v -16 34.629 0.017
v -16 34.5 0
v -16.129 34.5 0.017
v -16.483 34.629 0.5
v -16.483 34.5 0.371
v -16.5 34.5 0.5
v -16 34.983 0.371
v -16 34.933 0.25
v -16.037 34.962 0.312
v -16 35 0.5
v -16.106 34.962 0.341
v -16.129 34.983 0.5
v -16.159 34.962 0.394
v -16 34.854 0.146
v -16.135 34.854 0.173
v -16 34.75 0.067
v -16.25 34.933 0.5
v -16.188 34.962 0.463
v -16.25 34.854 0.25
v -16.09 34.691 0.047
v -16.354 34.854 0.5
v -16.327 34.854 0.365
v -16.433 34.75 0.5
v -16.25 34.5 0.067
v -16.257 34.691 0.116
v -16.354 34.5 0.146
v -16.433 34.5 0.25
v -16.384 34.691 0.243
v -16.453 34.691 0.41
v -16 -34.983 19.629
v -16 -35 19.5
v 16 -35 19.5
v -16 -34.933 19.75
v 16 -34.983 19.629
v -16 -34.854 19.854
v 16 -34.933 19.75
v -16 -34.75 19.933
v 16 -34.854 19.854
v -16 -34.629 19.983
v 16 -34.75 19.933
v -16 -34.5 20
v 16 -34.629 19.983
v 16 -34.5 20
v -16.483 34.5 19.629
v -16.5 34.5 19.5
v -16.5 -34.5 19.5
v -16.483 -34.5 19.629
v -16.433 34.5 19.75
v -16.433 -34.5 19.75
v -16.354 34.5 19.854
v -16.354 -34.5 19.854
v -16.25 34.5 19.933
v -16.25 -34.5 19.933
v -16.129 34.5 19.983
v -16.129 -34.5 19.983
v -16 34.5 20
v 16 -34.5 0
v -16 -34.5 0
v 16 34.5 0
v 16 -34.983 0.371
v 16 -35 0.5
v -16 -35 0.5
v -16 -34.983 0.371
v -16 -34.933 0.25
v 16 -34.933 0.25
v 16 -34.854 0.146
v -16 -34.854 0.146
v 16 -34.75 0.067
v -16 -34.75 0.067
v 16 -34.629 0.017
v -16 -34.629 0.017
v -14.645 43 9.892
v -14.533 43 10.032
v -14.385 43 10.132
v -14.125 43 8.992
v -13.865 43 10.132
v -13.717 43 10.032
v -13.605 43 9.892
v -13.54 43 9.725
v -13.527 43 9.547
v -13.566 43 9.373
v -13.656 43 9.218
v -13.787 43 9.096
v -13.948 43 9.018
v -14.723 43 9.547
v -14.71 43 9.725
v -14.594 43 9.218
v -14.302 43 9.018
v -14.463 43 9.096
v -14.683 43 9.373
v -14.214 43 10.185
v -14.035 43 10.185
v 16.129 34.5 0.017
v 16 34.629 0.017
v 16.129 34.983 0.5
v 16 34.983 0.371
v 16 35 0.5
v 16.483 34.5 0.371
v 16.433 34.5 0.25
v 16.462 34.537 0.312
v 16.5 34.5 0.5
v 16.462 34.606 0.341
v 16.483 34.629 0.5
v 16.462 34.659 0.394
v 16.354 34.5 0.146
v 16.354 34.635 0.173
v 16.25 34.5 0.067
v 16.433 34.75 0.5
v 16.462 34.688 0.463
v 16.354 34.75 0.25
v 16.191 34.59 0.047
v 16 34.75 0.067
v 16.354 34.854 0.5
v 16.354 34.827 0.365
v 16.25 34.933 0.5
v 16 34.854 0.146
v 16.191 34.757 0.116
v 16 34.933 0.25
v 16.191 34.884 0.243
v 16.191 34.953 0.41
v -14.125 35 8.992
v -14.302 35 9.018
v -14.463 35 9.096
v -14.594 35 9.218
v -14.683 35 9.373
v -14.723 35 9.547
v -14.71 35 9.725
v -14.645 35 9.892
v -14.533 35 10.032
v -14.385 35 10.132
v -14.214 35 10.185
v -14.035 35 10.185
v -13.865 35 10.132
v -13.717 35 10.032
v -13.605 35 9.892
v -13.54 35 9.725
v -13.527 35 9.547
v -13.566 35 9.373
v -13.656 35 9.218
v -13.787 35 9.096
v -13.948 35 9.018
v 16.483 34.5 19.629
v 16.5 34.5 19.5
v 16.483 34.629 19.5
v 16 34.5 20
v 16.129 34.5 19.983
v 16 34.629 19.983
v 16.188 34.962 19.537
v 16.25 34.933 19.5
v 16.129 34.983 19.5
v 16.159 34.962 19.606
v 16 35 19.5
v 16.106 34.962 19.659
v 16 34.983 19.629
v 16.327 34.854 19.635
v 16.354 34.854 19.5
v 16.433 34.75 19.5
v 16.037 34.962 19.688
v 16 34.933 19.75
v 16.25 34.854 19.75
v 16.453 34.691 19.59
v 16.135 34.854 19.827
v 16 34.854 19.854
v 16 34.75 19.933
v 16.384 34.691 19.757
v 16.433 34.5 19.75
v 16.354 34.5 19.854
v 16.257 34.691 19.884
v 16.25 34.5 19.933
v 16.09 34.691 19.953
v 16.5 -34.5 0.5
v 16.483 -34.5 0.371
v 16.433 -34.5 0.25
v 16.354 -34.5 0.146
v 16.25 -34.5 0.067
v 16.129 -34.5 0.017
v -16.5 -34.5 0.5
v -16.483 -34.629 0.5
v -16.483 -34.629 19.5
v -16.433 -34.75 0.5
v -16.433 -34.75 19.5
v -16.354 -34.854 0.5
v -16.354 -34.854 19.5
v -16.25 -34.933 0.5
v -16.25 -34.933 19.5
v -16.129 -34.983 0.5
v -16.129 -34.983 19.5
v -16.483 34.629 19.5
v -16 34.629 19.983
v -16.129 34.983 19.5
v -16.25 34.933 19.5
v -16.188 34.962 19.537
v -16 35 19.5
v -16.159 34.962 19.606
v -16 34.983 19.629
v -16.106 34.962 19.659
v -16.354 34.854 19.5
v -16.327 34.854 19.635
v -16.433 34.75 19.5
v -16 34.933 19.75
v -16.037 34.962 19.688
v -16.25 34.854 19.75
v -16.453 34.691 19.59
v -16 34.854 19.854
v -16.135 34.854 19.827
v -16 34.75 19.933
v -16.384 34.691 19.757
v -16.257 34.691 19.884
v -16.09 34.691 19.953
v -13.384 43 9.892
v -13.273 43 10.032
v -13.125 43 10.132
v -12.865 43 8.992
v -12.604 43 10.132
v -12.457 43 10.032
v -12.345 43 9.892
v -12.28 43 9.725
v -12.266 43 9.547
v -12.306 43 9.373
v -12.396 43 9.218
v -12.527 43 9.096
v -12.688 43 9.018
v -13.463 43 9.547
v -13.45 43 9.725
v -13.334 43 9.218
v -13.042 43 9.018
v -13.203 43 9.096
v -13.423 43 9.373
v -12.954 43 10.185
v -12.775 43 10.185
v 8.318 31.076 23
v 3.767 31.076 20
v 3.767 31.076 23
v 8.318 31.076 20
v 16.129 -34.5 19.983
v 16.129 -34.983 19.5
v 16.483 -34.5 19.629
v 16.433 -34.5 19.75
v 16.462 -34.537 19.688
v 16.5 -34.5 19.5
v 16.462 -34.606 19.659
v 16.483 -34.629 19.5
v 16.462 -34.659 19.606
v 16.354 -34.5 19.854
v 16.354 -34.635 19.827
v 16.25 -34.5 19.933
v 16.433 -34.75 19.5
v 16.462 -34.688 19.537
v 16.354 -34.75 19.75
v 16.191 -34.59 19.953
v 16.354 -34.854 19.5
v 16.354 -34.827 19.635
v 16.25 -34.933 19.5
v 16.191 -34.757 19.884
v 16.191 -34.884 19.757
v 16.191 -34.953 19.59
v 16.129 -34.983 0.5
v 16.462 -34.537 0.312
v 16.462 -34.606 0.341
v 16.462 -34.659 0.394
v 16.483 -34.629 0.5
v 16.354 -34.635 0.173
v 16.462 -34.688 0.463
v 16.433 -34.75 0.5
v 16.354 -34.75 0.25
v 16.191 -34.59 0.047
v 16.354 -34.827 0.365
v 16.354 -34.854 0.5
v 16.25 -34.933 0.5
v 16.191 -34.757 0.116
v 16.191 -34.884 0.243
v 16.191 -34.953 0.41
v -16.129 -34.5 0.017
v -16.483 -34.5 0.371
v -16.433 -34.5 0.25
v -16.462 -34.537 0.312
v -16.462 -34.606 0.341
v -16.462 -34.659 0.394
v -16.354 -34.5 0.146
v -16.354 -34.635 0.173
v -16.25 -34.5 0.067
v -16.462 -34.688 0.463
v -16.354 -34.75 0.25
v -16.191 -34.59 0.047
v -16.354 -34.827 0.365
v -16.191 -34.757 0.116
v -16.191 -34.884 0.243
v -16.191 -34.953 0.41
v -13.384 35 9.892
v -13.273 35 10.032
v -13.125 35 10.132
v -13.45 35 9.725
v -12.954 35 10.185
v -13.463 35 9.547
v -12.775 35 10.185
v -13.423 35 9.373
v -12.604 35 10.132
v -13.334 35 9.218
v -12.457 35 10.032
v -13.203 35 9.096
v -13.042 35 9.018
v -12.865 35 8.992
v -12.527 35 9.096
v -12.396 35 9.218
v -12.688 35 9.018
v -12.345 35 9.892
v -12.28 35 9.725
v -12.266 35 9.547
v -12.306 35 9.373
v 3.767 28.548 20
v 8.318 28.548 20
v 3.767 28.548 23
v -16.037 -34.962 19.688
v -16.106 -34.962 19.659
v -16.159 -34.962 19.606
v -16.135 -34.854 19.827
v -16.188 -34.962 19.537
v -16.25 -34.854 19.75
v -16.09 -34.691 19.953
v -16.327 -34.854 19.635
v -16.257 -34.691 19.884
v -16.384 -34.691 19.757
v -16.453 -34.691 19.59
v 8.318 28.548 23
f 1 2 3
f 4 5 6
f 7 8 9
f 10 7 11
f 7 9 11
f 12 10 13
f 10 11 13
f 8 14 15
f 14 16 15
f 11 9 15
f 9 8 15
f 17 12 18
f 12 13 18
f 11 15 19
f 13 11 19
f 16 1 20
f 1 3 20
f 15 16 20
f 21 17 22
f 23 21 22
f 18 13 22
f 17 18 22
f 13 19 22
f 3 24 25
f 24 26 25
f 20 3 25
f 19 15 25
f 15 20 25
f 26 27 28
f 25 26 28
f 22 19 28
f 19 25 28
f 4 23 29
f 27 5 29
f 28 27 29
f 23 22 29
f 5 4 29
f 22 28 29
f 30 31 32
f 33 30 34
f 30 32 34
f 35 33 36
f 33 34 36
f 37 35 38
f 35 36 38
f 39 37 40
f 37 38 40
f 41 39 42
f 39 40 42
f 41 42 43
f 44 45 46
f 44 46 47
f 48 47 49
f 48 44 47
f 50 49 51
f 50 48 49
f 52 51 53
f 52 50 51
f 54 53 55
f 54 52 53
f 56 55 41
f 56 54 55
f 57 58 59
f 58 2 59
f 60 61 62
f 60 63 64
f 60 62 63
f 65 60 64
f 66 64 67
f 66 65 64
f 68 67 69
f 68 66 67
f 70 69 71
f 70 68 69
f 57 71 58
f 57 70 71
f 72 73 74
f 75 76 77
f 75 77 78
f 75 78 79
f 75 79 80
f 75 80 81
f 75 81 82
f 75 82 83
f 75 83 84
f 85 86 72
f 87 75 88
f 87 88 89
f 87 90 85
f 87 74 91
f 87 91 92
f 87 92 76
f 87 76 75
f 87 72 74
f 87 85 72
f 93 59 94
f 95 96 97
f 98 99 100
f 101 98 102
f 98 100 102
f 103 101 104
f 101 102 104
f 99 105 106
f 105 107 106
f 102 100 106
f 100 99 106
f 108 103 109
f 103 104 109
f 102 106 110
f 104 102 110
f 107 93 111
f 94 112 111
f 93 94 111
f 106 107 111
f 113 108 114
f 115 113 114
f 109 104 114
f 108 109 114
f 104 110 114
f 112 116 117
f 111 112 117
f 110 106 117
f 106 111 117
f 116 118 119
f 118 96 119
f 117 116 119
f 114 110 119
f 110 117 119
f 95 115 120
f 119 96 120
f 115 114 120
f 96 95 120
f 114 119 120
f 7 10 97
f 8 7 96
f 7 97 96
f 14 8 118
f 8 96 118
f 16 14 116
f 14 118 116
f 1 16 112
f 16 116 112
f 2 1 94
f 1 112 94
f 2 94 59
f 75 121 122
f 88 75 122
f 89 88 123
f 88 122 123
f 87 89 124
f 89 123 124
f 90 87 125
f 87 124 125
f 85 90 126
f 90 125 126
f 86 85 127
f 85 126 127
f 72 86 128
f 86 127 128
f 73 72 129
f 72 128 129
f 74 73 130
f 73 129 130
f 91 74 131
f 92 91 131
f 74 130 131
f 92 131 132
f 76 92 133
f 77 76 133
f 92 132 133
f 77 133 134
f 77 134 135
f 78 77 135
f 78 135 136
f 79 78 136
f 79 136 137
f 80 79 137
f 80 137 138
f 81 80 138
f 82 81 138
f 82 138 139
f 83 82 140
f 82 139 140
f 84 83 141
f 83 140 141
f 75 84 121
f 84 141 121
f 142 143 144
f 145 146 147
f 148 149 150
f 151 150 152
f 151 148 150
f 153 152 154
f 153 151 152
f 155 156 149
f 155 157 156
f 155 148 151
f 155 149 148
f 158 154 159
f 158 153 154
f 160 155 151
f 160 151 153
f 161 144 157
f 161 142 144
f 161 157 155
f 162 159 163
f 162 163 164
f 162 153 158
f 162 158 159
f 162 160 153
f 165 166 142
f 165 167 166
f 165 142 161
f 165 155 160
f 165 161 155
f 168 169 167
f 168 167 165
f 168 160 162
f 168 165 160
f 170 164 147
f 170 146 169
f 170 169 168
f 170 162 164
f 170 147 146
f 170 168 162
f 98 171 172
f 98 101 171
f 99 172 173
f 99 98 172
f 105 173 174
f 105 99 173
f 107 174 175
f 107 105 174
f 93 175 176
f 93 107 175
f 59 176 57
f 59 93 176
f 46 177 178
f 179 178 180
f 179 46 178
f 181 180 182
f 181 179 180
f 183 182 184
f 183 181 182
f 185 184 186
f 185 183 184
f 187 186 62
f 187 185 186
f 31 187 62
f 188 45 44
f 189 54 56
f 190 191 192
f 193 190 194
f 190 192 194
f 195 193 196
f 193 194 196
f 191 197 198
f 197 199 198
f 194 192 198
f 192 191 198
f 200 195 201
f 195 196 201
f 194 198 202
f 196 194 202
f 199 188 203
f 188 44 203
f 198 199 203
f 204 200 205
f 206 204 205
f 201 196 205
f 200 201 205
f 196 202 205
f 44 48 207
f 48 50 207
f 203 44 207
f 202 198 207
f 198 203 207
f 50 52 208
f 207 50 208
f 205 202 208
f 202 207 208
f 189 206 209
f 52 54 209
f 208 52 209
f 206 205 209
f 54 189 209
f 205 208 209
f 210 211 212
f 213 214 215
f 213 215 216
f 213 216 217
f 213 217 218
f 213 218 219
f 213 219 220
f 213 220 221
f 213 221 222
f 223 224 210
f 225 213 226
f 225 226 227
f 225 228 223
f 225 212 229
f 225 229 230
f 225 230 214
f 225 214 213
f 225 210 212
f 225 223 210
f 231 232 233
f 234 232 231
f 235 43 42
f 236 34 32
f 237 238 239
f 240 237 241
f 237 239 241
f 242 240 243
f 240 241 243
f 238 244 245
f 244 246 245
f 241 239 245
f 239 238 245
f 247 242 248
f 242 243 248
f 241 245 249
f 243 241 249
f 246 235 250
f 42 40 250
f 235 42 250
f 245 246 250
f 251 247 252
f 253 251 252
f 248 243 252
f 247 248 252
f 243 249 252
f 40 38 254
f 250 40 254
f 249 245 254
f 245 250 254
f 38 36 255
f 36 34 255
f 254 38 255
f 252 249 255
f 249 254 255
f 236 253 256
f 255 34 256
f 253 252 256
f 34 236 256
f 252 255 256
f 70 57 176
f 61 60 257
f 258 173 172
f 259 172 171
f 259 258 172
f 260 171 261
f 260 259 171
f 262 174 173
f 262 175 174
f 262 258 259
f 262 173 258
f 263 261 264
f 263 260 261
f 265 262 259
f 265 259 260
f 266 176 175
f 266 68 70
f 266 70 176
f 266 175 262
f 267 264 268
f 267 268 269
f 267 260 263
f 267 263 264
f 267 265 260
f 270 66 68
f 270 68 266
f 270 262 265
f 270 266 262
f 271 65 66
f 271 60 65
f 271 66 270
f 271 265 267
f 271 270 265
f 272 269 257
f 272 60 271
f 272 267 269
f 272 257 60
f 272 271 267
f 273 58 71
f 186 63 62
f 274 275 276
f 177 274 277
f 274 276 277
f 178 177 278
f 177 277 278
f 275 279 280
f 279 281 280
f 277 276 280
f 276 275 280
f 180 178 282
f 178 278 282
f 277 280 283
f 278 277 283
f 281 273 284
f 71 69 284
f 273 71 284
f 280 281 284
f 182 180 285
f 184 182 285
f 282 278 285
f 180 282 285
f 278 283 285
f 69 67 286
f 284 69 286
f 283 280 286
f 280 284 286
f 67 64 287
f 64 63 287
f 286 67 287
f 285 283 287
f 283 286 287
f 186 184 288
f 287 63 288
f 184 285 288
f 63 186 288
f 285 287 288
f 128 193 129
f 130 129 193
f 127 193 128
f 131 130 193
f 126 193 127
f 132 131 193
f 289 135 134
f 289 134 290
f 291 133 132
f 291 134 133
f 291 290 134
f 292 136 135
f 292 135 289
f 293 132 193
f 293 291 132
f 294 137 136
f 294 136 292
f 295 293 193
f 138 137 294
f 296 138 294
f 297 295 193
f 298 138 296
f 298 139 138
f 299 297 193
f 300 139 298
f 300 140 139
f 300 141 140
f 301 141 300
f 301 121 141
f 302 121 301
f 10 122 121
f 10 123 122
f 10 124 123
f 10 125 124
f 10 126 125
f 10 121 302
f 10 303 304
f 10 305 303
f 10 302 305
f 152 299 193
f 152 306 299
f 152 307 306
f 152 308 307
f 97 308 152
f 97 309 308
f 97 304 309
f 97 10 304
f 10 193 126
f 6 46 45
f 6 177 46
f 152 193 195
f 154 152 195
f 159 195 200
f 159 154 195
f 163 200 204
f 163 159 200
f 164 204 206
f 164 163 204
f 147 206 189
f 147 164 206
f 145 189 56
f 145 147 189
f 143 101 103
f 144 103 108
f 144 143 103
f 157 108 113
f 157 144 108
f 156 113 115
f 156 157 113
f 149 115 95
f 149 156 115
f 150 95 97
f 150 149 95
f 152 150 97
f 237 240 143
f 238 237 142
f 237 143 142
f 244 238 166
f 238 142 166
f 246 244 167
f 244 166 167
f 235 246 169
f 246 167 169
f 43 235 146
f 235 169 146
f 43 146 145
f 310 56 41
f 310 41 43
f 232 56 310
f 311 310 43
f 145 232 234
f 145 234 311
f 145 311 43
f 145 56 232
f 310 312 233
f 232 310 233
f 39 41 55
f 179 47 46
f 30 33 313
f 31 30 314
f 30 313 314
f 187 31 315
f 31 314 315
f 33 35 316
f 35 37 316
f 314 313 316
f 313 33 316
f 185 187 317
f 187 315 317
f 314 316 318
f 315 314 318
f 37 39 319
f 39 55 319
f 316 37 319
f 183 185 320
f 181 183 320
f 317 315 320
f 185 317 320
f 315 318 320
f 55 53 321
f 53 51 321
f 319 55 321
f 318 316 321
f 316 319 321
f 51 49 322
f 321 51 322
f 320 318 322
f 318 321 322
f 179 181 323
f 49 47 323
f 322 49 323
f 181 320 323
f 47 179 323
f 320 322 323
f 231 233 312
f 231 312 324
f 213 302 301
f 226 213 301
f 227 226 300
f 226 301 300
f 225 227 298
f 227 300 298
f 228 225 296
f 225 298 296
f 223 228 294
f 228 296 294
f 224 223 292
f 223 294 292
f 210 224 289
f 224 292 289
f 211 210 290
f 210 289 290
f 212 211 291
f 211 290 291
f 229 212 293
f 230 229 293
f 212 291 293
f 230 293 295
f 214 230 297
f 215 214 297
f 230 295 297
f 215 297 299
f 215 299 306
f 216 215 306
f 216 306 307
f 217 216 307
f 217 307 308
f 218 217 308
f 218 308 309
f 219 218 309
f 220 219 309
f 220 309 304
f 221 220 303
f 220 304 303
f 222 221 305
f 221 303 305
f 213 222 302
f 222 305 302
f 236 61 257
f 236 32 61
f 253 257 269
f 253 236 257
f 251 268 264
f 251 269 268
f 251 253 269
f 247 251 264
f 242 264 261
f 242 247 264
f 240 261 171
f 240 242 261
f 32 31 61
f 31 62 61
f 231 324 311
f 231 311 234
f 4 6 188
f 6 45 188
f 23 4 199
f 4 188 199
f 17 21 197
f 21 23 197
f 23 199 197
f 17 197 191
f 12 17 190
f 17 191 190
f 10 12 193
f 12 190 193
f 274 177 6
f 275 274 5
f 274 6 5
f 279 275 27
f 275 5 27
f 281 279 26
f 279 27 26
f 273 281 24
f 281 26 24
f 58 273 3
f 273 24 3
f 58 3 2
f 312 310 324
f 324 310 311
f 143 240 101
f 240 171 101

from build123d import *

# Parameters (mm, degrees)
SKETCH1_W           = 33
SKETCH1_H           = 70
BOSS_EXTRUDE1_DEPTH = 20
FILLET1_R           = 0.5
SKETCH2_R           = 0.6
WIRES_2_DEPTH       = 8
SKETCH3_W           = 4.550623551
SKETCH3_H           = 2.528124195
POWER_SWITCH_DEPTH  = 3


with BuildPart() as part:
    # Sketch1 → Boss-Extrude1 (new body)
    with BuildSketch(Plane.XY):
        Rectangle(SKETCH1_W, SKETCH1_H)
    extrude(amount=BOSS_EXTRUDE1_DEPTH)

    # Fillet1
    fillet1_edges = [part.edges().sort_by_distance(p)[0] for p in [
        (-16.5, 0, 20),
        (0, -35, 20),
        (16.5, 0, 20),
        (0, -35, 0),
        (-16.5, 0, 0),
        (0, 35, 0),
        (16.5, 0, 0),
        (16.5, -35, 10),
        (-16.5, -35, 10),
        (-16.5, 35, 10),
        (16.5, 35, 10),
        (0, 35, 20),
    ]]
    fillet(fillet1_edges, radius=FILLET1_R)

    # Sketch2 → Wires 2 (add)
    with BuildSketch(Plane(origin=(0, 35, 0), x_dir=(1, 0, 0), z_dir=(0, 1, 0))):
        with Locations(Location((-14.124921584, -9.591772622, 0), (0, 0, 90))):
            Circle(SKETCH2_R)
        with Locations(Location((-12.864771316, -9.591772622, 0), (0, 0, 90))):
            Circle(SKETCH2_R)
    extrude(amount=WIRES_2_DEPTH)

    # Sketch3 → Power Switch (add)
    with BuildSketch(Plane.XY.offset(20)):
        with Locations((6.042216827, 29.812148032)):
            Rectangle(SKETCH3_W, SKETCH3_H)
    extrude(amount=POWER_SWITCH_DEPTH)


solid = part.part
